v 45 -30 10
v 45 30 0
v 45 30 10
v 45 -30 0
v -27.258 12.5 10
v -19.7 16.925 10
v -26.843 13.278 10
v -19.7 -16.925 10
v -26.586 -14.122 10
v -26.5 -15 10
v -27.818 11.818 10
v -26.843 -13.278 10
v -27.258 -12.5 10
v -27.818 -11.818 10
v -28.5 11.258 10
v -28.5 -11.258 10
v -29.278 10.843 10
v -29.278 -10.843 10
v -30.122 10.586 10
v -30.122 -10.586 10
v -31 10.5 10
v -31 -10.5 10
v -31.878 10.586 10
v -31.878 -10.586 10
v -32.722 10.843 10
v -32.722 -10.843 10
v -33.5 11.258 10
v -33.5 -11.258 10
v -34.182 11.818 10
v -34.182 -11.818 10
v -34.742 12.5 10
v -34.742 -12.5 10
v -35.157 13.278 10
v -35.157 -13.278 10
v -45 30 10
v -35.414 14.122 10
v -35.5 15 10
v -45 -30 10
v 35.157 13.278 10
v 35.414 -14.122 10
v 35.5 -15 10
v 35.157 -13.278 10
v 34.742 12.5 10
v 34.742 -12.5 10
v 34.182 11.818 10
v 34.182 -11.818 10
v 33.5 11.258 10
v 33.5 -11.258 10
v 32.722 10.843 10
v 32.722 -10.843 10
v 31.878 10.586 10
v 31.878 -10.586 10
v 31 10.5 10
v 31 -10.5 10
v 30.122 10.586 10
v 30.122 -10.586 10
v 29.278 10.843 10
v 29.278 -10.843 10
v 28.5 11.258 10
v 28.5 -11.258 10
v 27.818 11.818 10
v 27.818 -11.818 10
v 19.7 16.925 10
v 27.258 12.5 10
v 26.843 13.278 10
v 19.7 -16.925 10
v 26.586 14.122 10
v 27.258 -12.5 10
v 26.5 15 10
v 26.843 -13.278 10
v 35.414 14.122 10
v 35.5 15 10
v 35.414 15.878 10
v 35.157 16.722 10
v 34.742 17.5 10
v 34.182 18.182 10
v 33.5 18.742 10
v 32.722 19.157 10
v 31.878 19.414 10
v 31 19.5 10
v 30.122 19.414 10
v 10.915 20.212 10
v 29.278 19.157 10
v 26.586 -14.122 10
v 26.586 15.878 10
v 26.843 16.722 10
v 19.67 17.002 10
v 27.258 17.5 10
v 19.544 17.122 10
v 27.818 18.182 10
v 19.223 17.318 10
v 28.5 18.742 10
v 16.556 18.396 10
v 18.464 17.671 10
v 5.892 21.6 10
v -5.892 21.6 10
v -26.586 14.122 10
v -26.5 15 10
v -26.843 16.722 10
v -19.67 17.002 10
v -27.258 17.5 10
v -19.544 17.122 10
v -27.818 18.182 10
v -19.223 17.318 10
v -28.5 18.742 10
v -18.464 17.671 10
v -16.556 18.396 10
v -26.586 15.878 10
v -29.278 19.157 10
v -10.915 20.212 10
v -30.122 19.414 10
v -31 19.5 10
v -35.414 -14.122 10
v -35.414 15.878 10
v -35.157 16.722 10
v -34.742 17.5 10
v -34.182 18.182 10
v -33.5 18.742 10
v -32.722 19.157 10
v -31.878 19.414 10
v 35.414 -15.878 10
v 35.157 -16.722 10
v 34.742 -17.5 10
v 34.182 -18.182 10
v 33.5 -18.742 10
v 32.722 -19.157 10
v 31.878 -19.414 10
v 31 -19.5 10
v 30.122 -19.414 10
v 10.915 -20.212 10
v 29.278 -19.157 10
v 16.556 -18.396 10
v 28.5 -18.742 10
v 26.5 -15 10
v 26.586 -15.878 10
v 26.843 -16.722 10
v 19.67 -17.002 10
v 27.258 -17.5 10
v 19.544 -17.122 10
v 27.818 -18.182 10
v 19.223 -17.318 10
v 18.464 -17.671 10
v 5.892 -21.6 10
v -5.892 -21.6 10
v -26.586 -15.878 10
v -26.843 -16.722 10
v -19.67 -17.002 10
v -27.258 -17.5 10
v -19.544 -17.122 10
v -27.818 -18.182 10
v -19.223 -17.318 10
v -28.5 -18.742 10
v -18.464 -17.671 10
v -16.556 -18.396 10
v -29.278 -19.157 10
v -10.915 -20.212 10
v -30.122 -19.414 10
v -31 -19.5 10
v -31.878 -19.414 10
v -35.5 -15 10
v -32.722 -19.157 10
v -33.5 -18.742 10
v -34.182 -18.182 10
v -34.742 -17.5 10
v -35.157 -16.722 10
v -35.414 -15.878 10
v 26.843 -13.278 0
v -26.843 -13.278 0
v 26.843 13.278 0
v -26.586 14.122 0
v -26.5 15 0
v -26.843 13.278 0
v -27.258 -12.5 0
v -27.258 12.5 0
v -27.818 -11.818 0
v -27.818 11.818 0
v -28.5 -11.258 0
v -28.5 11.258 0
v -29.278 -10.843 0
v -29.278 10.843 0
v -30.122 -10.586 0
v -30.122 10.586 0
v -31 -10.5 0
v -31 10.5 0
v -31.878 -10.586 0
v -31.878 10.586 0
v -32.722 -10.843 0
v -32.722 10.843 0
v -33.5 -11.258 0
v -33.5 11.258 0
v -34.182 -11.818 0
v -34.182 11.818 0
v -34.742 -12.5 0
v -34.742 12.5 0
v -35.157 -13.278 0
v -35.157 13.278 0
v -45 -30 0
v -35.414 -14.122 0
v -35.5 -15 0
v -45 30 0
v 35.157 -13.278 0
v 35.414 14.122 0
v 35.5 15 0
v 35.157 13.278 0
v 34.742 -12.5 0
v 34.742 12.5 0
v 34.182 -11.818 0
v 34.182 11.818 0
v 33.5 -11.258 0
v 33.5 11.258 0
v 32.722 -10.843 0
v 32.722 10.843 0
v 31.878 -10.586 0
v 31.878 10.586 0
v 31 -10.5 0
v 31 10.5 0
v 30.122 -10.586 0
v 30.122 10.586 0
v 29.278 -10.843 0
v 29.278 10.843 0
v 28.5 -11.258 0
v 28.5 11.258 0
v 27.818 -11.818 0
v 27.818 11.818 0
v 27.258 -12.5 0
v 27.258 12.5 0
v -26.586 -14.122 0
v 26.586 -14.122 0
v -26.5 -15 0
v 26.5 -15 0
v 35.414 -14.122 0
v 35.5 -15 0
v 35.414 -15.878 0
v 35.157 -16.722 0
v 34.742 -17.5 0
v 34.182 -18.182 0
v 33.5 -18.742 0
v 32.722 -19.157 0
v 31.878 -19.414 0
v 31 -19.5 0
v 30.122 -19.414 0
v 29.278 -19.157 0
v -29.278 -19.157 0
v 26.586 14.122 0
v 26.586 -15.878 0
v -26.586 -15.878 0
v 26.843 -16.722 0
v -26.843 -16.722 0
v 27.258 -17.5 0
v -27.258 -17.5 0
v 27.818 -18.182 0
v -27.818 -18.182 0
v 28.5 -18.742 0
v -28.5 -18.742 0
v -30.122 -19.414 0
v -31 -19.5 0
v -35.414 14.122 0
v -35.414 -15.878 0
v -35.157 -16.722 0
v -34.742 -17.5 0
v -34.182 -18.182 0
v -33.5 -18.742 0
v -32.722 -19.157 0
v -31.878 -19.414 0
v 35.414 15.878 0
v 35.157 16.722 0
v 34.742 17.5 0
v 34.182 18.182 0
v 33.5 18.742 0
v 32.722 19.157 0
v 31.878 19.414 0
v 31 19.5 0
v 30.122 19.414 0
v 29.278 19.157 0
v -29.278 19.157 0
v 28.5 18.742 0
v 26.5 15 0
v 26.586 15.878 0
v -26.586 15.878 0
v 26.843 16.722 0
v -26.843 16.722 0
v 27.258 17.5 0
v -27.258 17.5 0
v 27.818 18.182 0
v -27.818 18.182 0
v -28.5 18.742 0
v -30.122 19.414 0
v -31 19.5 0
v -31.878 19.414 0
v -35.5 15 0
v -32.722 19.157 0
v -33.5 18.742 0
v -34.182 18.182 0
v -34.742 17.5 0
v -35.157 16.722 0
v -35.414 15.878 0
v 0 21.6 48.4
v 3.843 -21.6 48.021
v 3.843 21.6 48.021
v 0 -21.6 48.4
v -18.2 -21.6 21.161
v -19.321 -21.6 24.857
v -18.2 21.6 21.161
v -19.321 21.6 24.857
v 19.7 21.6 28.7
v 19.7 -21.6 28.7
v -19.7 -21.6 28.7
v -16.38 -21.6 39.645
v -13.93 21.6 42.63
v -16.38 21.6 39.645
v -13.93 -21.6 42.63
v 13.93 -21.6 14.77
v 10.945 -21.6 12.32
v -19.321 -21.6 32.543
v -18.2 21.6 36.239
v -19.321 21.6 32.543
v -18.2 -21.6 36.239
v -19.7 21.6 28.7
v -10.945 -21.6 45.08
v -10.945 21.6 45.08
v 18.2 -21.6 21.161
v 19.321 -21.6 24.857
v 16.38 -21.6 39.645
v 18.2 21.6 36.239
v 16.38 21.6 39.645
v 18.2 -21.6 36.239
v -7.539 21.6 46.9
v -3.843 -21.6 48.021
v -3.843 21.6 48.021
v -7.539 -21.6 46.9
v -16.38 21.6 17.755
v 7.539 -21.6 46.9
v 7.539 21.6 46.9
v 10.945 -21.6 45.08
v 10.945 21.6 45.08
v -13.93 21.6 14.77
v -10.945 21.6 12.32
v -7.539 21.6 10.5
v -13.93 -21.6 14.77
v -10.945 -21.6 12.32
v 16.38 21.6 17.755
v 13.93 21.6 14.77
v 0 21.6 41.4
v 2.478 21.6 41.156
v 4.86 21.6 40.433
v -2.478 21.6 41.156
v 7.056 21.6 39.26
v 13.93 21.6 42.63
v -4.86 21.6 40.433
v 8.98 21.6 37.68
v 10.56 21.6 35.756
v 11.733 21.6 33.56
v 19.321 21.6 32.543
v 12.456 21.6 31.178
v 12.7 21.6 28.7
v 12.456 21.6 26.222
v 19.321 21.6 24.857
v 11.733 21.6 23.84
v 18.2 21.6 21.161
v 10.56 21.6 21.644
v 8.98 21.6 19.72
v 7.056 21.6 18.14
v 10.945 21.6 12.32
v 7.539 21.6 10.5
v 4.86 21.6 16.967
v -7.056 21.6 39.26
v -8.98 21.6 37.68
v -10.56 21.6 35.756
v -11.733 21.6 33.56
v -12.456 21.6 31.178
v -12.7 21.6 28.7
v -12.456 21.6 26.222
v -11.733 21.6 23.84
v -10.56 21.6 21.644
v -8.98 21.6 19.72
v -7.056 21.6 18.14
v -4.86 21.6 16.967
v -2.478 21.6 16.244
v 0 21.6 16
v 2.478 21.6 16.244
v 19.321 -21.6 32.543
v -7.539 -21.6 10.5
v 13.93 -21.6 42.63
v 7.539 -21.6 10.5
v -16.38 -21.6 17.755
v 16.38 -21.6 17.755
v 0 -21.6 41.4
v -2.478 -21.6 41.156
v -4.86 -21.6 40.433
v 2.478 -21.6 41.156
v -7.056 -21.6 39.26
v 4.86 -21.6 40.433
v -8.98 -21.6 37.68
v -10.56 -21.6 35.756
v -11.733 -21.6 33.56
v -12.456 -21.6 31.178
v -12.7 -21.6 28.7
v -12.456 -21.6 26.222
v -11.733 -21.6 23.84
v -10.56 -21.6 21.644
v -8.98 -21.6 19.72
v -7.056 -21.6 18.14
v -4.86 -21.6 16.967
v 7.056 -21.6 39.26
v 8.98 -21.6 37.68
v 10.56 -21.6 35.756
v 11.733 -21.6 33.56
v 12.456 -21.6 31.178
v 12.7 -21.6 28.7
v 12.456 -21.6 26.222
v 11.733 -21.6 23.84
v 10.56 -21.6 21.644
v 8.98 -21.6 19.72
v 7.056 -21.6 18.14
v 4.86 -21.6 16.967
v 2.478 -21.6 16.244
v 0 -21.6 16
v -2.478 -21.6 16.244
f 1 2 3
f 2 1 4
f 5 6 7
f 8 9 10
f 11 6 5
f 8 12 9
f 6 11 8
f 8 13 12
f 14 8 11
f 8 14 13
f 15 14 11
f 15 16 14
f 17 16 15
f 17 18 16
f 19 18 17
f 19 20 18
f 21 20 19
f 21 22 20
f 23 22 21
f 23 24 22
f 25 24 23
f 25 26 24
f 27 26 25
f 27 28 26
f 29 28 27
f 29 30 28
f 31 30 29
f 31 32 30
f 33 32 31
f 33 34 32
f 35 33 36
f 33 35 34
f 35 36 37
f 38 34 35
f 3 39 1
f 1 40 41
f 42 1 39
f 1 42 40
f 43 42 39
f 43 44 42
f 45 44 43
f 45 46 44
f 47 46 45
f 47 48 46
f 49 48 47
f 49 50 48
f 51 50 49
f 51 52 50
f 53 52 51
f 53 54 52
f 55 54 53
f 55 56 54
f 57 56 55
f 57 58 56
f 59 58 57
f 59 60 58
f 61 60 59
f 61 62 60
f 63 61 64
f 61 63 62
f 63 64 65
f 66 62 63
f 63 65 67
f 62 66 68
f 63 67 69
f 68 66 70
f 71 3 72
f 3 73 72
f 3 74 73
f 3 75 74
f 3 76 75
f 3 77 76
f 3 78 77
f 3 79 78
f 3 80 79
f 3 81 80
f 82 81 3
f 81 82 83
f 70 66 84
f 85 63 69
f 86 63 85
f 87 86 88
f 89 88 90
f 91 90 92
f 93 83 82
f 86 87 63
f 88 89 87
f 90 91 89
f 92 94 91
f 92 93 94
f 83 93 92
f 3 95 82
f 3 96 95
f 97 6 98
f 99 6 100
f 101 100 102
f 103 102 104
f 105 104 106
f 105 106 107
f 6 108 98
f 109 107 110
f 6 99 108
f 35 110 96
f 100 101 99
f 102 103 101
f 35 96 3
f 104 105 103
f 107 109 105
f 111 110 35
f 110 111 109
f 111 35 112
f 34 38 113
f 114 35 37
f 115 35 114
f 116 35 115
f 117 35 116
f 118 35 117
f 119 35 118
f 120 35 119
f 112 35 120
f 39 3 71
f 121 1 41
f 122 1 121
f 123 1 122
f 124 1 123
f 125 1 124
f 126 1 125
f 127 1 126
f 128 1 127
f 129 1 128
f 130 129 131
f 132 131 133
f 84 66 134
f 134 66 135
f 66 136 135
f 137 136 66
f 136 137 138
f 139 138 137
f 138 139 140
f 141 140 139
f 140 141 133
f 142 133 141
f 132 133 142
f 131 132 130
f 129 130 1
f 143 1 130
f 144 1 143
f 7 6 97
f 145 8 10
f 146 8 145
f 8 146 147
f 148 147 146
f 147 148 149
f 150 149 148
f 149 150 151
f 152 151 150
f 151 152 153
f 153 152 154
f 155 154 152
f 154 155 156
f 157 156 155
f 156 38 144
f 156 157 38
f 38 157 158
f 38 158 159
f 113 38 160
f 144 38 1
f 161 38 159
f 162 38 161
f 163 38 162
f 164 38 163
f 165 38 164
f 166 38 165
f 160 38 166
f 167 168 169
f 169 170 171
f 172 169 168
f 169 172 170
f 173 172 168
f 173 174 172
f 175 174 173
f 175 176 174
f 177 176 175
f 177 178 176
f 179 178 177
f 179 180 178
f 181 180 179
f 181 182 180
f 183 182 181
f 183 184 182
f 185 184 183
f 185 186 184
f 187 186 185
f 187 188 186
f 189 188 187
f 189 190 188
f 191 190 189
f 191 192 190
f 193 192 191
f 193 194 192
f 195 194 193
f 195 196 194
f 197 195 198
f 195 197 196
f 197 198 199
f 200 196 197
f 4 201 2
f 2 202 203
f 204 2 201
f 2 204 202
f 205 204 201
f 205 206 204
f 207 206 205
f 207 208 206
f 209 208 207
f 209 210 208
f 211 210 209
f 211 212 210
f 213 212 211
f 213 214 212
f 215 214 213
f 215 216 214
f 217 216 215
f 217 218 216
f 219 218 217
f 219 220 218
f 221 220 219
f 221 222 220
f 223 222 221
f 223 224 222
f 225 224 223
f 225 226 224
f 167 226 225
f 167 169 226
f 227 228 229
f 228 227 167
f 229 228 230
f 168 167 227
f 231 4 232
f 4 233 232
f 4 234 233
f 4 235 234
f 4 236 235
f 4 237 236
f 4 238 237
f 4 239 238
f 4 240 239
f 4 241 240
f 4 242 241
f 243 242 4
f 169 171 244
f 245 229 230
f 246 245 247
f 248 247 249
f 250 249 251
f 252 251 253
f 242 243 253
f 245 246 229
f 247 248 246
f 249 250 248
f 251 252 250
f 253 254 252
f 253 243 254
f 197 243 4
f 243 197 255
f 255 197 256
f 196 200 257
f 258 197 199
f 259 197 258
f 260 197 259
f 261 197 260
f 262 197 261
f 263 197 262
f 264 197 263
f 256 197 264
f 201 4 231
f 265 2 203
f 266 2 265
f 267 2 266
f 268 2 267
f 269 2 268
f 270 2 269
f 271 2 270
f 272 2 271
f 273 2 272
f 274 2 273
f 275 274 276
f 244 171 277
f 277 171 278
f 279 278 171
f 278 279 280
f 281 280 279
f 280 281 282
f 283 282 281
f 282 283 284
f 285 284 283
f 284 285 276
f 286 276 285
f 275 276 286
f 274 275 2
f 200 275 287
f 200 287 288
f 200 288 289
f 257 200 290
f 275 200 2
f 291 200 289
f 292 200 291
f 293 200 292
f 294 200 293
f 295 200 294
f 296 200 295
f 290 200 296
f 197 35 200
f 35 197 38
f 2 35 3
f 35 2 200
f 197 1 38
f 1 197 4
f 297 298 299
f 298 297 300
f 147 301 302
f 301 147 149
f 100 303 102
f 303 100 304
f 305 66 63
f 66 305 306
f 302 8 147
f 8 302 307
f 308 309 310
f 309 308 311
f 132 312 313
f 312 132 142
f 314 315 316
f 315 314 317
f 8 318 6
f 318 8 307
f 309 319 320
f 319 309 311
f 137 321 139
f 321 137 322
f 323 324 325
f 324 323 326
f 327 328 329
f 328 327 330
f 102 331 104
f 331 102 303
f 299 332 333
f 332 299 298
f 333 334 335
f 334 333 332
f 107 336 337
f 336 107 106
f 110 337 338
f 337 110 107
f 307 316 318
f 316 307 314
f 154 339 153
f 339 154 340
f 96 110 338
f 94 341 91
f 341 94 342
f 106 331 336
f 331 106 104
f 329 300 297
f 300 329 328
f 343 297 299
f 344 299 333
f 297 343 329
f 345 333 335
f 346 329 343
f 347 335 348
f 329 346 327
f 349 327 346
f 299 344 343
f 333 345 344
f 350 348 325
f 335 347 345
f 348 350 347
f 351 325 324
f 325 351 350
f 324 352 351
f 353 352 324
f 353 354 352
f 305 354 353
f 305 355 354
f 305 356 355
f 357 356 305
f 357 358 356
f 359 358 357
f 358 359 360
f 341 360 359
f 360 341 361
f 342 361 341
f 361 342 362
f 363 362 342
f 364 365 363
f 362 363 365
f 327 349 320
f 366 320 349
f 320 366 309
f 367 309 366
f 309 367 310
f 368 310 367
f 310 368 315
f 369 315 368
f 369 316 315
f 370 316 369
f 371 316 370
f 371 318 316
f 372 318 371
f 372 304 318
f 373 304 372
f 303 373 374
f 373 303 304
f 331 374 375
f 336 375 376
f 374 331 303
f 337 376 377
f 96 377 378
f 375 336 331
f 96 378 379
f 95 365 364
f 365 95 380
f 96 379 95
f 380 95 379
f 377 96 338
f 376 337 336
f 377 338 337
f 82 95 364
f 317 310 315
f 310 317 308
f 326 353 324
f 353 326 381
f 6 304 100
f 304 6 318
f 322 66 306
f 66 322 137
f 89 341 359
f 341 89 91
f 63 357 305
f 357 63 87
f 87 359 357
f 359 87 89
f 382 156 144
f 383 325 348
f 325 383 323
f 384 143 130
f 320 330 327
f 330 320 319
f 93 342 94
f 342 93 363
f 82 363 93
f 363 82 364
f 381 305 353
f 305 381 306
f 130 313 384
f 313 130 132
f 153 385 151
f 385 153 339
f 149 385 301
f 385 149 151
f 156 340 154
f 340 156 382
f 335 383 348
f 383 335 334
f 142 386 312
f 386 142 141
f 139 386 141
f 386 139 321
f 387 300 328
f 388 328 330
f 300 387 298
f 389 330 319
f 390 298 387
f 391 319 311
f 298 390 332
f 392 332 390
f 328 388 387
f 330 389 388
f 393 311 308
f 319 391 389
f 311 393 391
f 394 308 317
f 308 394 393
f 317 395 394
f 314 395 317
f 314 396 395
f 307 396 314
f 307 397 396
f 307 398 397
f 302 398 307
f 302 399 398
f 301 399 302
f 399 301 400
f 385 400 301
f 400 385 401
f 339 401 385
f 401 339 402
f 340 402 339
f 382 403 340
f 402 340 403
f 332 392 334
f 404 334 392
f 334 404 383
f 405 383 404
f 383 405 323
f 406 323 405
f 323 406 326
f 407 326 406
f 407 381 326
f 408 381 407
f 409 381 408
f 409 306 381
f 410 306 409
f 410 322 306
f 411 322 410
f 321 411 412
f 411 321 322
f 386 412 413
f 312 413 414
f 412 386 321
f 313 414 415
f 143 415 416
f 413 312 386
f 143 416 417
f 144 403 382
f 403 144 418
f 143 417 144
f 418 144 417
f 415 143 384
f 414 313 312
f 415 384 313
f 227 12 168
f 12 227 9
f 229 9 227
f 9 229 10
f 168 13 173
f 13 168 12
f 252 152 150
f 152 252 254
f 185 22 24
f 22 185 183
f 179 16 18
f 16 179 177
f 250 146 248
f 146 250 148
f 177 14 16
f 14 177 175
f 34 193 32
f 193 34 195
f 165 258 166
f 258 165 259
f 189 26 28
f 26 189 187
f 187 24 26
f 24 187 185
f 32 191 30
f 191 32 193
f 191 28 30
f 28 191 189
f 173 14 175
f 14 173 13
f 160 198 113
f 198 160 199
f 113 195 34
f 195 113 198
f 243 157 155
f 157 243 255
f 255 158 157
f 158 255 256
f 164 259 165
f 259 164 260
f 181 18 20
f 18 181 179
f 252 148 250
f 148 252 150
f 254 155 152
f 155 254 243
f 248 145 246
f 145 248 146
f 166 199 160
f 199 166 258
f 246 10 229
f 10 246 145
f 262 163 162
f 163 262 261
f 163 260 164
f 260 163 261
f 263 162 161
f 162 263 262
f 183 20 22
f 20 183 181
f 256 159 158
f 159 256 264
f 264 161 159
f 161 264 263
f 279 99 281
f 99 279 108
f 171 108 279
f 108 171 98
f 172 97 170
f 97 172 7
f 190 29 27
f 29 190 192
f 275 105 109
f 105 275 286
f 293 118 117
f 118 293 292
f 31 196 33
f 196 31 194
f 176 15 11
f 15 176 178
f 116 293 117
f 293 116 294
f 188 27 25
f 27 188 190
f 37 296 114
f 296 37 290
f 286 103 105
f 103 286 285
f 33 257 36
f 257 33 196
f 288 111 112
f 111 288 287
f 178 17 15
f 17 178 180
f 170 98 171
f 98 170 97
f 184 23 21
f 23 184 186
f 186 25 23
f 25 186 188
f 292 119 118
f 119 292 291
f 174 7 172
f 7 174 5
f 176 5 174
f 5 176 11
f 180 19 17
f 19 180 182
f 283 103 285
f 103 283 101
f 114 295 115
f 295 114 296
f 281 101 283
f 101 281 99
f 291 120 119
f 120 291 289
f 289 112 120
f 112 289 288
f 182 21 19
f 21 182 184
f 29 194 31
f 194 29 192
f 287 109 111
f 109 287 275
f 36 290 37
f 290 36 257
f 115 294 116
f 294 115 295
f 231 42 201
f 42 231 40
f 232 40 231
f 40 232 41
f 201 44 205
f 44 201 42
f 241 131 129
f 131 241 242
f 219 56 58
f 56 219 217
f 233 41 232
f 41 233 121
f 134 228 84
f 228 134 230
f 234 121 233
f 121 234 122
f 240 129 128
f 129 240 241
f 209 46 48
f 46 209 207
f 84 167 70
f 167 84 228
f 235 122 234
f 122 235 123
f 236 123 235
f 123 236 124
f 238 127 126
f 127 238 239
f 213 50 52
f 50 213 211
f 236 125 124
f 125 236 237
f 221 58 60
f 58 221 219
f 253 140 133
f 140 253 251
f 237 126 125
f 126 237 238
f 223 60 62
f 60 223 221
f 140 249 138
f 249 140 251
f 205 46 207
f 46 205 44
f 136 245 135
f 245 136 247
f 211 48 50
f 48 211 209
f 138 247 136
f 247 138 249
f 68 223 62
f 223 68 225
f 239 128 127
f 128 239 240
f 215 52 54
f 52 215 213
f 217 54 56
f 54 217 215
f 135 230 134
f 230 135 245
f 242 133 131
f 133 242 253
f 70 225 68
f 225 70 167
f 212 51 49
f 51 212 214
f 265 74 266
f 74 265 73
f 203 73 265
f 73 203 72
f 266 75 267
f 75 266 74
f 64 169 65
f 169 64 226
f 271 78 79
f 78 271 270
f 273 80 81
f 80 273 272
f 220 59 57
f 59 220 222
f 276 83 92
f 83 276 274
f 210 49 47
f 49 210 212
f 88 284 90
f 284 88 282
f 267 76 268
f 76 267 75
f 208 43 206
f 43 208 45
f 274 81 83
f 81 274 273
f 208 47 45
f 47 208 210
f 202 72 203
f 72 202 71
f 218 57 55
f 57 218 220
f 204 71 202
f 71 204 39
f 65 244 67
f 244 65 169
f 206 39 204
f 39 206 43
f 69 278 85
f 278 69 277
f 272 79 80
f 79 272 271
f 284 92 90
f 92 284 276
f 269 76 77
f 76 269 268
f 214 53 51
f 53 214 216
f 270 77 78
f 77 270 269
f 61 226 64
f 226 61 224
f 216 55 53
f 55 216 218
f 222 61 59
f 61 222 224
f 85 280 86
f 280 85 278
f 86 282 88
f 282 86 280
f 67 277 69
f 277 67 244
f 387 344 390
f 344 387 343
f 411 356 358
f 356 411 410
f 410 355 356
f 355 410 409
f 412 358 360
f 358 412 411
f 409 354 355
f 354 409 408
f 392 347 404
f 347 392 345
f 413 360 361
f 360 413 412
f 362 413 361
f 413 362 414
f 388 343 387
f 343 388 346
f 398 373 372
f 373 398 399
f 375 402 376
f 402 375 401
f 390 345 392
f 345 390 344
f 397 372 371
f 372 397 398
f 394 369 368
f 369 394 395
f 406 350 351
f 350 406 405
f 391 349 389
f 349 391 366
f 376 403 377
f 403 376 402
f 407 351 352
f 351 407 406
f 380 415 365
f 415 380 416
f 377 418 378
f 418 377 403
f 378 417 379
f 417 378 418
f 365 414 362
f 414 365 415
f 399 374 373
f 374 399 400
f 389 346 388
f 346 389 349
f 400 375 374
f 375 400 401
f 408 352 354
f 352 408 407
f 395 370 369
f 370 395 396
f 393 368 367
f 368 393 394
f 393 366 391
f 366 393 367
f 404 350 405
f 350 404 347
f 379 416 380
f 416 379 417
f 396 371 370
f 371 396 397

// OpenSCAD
$fn = 32;

// ----------------------------------------------------------------------
// Bearing block: 90 x 60 mm base, 25.4 mm bore at 28.7 mm
// ----------------------------------------------------------------------

// --- parameters (mm) ---
base_w = 90;              // base width
base_d = 60;              // base depth
base_t = 10;              // base thickness
bore_d = 25.4;            // shaft / bearing bore
house_r = 19.7;           // housing outer radius
house_len = 43.2;         // housing length along the shaft
foot_w = 39.4;            // foot width under the housing
foot_len = 33.2;          // foot length along the shaft
axis_z = 28.7;            // bore axis height above the base
holes_d = 9;              // mounting holes
hole_x = 31;              // mounting hole spacing

difference() {
  union() {
    /* base plate with its underside on z = 0 */
    translate([0, 0, base_t / 2]) cube([base_w, base_d, base_t], center = true);
    /* hull foot: a straight web blending into the round housing */
    hull() {
      translate([0, 0, base_t - 0.5]) cube([foot_w, foot_len, 1.6], center = true);
      translate([0, 0, axis_z]) rotate([-90, 0, 0]) cylinder(h = house_len, d = 2 * house_r, center = true);
    }
  }
  /* bore through the housing, 2.5 mm clear on both sides */
  translate([0, 0, axis_z]) rotate([-90, 0, 0]) cylinder(h = house_len + 5, d = bore_d, center = true);
  /* mounting holes through the base plate */
  for (hx = [-31, 31]) {
    for (hy = [-15, 15]) {
      translate([hx, hy, -2.5]) cylinder(h = base_t + 5, d = holes_d);
    }
  }
}
